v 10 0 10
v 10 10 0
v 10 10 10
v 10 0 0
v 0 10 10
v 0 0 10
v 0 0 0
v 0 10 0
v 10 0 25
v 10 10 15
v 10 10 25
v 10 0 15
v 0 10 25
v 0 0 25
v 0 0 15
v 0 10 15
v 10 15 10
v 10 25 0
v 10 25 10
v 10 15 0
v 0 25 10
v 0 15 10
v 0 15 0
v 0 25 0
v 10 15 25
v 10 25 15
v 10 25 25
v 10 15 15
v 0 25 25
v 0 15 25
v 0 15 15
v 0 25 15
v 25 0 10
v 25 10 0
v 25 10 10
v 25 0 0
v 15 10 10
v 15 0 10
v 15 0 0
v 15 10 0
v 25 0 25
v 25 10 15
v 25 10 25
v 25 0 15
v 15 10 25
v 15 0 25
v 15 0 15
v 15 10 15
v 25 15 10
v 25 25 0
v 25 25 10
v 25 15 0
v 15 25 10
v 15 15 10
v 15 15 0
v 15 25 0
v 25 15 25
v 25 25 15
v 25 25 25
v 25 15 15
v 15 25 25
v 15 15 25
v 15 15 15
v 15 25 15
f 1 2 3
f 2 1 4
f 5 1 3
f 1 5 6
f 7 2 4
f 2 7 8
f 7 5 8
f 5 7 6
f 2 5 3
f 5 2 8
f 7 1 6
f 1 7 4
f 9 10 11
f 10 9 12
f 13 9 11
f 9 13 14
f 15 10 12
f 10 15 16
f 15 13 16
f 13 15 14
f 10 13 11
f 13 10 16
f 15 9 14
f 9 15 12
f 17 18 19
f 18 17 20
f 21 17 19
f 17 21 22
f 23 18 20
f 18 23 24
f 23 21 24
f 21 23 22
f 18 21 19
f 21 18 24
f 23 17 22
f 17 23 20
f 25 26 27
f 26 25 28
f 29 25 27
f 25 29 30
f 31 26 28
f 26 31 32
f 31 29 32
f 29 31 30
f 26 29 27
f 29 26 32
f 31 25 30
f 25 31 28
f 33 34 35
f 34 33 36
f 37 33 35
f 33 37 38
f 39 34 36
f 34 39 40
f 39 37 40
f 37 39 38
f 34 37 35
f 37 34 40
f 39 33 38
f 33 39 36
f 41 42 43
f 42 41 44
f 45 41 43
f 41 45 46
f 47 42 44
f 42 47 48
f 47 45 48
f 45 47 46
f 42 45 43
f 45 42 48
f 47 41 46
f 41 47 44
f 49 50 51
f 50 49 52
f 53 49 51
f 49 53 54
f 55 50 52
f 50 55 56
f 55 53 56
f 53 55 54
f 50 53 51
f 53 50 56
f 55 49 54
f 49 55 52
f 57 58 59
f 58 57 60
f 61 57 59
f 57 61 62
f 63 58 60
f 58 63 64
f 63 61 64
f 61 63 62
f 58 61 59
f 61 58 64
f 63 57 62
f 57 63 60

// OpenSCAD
cubes = 2;
cubesize = 10;
spacing = 5;

for(x = [0:cubes - 1]) {
	for(y = [0:cubes - 1]) {
		for(z = [0:cubes - 1]) {
			translate([x * (cubesize + spacing),y * (cubesize + spacing),z * (cubesize + spacing)]) {
				cube([cubesize,cubesize,cubesize]);
			}
		}
	}
}
